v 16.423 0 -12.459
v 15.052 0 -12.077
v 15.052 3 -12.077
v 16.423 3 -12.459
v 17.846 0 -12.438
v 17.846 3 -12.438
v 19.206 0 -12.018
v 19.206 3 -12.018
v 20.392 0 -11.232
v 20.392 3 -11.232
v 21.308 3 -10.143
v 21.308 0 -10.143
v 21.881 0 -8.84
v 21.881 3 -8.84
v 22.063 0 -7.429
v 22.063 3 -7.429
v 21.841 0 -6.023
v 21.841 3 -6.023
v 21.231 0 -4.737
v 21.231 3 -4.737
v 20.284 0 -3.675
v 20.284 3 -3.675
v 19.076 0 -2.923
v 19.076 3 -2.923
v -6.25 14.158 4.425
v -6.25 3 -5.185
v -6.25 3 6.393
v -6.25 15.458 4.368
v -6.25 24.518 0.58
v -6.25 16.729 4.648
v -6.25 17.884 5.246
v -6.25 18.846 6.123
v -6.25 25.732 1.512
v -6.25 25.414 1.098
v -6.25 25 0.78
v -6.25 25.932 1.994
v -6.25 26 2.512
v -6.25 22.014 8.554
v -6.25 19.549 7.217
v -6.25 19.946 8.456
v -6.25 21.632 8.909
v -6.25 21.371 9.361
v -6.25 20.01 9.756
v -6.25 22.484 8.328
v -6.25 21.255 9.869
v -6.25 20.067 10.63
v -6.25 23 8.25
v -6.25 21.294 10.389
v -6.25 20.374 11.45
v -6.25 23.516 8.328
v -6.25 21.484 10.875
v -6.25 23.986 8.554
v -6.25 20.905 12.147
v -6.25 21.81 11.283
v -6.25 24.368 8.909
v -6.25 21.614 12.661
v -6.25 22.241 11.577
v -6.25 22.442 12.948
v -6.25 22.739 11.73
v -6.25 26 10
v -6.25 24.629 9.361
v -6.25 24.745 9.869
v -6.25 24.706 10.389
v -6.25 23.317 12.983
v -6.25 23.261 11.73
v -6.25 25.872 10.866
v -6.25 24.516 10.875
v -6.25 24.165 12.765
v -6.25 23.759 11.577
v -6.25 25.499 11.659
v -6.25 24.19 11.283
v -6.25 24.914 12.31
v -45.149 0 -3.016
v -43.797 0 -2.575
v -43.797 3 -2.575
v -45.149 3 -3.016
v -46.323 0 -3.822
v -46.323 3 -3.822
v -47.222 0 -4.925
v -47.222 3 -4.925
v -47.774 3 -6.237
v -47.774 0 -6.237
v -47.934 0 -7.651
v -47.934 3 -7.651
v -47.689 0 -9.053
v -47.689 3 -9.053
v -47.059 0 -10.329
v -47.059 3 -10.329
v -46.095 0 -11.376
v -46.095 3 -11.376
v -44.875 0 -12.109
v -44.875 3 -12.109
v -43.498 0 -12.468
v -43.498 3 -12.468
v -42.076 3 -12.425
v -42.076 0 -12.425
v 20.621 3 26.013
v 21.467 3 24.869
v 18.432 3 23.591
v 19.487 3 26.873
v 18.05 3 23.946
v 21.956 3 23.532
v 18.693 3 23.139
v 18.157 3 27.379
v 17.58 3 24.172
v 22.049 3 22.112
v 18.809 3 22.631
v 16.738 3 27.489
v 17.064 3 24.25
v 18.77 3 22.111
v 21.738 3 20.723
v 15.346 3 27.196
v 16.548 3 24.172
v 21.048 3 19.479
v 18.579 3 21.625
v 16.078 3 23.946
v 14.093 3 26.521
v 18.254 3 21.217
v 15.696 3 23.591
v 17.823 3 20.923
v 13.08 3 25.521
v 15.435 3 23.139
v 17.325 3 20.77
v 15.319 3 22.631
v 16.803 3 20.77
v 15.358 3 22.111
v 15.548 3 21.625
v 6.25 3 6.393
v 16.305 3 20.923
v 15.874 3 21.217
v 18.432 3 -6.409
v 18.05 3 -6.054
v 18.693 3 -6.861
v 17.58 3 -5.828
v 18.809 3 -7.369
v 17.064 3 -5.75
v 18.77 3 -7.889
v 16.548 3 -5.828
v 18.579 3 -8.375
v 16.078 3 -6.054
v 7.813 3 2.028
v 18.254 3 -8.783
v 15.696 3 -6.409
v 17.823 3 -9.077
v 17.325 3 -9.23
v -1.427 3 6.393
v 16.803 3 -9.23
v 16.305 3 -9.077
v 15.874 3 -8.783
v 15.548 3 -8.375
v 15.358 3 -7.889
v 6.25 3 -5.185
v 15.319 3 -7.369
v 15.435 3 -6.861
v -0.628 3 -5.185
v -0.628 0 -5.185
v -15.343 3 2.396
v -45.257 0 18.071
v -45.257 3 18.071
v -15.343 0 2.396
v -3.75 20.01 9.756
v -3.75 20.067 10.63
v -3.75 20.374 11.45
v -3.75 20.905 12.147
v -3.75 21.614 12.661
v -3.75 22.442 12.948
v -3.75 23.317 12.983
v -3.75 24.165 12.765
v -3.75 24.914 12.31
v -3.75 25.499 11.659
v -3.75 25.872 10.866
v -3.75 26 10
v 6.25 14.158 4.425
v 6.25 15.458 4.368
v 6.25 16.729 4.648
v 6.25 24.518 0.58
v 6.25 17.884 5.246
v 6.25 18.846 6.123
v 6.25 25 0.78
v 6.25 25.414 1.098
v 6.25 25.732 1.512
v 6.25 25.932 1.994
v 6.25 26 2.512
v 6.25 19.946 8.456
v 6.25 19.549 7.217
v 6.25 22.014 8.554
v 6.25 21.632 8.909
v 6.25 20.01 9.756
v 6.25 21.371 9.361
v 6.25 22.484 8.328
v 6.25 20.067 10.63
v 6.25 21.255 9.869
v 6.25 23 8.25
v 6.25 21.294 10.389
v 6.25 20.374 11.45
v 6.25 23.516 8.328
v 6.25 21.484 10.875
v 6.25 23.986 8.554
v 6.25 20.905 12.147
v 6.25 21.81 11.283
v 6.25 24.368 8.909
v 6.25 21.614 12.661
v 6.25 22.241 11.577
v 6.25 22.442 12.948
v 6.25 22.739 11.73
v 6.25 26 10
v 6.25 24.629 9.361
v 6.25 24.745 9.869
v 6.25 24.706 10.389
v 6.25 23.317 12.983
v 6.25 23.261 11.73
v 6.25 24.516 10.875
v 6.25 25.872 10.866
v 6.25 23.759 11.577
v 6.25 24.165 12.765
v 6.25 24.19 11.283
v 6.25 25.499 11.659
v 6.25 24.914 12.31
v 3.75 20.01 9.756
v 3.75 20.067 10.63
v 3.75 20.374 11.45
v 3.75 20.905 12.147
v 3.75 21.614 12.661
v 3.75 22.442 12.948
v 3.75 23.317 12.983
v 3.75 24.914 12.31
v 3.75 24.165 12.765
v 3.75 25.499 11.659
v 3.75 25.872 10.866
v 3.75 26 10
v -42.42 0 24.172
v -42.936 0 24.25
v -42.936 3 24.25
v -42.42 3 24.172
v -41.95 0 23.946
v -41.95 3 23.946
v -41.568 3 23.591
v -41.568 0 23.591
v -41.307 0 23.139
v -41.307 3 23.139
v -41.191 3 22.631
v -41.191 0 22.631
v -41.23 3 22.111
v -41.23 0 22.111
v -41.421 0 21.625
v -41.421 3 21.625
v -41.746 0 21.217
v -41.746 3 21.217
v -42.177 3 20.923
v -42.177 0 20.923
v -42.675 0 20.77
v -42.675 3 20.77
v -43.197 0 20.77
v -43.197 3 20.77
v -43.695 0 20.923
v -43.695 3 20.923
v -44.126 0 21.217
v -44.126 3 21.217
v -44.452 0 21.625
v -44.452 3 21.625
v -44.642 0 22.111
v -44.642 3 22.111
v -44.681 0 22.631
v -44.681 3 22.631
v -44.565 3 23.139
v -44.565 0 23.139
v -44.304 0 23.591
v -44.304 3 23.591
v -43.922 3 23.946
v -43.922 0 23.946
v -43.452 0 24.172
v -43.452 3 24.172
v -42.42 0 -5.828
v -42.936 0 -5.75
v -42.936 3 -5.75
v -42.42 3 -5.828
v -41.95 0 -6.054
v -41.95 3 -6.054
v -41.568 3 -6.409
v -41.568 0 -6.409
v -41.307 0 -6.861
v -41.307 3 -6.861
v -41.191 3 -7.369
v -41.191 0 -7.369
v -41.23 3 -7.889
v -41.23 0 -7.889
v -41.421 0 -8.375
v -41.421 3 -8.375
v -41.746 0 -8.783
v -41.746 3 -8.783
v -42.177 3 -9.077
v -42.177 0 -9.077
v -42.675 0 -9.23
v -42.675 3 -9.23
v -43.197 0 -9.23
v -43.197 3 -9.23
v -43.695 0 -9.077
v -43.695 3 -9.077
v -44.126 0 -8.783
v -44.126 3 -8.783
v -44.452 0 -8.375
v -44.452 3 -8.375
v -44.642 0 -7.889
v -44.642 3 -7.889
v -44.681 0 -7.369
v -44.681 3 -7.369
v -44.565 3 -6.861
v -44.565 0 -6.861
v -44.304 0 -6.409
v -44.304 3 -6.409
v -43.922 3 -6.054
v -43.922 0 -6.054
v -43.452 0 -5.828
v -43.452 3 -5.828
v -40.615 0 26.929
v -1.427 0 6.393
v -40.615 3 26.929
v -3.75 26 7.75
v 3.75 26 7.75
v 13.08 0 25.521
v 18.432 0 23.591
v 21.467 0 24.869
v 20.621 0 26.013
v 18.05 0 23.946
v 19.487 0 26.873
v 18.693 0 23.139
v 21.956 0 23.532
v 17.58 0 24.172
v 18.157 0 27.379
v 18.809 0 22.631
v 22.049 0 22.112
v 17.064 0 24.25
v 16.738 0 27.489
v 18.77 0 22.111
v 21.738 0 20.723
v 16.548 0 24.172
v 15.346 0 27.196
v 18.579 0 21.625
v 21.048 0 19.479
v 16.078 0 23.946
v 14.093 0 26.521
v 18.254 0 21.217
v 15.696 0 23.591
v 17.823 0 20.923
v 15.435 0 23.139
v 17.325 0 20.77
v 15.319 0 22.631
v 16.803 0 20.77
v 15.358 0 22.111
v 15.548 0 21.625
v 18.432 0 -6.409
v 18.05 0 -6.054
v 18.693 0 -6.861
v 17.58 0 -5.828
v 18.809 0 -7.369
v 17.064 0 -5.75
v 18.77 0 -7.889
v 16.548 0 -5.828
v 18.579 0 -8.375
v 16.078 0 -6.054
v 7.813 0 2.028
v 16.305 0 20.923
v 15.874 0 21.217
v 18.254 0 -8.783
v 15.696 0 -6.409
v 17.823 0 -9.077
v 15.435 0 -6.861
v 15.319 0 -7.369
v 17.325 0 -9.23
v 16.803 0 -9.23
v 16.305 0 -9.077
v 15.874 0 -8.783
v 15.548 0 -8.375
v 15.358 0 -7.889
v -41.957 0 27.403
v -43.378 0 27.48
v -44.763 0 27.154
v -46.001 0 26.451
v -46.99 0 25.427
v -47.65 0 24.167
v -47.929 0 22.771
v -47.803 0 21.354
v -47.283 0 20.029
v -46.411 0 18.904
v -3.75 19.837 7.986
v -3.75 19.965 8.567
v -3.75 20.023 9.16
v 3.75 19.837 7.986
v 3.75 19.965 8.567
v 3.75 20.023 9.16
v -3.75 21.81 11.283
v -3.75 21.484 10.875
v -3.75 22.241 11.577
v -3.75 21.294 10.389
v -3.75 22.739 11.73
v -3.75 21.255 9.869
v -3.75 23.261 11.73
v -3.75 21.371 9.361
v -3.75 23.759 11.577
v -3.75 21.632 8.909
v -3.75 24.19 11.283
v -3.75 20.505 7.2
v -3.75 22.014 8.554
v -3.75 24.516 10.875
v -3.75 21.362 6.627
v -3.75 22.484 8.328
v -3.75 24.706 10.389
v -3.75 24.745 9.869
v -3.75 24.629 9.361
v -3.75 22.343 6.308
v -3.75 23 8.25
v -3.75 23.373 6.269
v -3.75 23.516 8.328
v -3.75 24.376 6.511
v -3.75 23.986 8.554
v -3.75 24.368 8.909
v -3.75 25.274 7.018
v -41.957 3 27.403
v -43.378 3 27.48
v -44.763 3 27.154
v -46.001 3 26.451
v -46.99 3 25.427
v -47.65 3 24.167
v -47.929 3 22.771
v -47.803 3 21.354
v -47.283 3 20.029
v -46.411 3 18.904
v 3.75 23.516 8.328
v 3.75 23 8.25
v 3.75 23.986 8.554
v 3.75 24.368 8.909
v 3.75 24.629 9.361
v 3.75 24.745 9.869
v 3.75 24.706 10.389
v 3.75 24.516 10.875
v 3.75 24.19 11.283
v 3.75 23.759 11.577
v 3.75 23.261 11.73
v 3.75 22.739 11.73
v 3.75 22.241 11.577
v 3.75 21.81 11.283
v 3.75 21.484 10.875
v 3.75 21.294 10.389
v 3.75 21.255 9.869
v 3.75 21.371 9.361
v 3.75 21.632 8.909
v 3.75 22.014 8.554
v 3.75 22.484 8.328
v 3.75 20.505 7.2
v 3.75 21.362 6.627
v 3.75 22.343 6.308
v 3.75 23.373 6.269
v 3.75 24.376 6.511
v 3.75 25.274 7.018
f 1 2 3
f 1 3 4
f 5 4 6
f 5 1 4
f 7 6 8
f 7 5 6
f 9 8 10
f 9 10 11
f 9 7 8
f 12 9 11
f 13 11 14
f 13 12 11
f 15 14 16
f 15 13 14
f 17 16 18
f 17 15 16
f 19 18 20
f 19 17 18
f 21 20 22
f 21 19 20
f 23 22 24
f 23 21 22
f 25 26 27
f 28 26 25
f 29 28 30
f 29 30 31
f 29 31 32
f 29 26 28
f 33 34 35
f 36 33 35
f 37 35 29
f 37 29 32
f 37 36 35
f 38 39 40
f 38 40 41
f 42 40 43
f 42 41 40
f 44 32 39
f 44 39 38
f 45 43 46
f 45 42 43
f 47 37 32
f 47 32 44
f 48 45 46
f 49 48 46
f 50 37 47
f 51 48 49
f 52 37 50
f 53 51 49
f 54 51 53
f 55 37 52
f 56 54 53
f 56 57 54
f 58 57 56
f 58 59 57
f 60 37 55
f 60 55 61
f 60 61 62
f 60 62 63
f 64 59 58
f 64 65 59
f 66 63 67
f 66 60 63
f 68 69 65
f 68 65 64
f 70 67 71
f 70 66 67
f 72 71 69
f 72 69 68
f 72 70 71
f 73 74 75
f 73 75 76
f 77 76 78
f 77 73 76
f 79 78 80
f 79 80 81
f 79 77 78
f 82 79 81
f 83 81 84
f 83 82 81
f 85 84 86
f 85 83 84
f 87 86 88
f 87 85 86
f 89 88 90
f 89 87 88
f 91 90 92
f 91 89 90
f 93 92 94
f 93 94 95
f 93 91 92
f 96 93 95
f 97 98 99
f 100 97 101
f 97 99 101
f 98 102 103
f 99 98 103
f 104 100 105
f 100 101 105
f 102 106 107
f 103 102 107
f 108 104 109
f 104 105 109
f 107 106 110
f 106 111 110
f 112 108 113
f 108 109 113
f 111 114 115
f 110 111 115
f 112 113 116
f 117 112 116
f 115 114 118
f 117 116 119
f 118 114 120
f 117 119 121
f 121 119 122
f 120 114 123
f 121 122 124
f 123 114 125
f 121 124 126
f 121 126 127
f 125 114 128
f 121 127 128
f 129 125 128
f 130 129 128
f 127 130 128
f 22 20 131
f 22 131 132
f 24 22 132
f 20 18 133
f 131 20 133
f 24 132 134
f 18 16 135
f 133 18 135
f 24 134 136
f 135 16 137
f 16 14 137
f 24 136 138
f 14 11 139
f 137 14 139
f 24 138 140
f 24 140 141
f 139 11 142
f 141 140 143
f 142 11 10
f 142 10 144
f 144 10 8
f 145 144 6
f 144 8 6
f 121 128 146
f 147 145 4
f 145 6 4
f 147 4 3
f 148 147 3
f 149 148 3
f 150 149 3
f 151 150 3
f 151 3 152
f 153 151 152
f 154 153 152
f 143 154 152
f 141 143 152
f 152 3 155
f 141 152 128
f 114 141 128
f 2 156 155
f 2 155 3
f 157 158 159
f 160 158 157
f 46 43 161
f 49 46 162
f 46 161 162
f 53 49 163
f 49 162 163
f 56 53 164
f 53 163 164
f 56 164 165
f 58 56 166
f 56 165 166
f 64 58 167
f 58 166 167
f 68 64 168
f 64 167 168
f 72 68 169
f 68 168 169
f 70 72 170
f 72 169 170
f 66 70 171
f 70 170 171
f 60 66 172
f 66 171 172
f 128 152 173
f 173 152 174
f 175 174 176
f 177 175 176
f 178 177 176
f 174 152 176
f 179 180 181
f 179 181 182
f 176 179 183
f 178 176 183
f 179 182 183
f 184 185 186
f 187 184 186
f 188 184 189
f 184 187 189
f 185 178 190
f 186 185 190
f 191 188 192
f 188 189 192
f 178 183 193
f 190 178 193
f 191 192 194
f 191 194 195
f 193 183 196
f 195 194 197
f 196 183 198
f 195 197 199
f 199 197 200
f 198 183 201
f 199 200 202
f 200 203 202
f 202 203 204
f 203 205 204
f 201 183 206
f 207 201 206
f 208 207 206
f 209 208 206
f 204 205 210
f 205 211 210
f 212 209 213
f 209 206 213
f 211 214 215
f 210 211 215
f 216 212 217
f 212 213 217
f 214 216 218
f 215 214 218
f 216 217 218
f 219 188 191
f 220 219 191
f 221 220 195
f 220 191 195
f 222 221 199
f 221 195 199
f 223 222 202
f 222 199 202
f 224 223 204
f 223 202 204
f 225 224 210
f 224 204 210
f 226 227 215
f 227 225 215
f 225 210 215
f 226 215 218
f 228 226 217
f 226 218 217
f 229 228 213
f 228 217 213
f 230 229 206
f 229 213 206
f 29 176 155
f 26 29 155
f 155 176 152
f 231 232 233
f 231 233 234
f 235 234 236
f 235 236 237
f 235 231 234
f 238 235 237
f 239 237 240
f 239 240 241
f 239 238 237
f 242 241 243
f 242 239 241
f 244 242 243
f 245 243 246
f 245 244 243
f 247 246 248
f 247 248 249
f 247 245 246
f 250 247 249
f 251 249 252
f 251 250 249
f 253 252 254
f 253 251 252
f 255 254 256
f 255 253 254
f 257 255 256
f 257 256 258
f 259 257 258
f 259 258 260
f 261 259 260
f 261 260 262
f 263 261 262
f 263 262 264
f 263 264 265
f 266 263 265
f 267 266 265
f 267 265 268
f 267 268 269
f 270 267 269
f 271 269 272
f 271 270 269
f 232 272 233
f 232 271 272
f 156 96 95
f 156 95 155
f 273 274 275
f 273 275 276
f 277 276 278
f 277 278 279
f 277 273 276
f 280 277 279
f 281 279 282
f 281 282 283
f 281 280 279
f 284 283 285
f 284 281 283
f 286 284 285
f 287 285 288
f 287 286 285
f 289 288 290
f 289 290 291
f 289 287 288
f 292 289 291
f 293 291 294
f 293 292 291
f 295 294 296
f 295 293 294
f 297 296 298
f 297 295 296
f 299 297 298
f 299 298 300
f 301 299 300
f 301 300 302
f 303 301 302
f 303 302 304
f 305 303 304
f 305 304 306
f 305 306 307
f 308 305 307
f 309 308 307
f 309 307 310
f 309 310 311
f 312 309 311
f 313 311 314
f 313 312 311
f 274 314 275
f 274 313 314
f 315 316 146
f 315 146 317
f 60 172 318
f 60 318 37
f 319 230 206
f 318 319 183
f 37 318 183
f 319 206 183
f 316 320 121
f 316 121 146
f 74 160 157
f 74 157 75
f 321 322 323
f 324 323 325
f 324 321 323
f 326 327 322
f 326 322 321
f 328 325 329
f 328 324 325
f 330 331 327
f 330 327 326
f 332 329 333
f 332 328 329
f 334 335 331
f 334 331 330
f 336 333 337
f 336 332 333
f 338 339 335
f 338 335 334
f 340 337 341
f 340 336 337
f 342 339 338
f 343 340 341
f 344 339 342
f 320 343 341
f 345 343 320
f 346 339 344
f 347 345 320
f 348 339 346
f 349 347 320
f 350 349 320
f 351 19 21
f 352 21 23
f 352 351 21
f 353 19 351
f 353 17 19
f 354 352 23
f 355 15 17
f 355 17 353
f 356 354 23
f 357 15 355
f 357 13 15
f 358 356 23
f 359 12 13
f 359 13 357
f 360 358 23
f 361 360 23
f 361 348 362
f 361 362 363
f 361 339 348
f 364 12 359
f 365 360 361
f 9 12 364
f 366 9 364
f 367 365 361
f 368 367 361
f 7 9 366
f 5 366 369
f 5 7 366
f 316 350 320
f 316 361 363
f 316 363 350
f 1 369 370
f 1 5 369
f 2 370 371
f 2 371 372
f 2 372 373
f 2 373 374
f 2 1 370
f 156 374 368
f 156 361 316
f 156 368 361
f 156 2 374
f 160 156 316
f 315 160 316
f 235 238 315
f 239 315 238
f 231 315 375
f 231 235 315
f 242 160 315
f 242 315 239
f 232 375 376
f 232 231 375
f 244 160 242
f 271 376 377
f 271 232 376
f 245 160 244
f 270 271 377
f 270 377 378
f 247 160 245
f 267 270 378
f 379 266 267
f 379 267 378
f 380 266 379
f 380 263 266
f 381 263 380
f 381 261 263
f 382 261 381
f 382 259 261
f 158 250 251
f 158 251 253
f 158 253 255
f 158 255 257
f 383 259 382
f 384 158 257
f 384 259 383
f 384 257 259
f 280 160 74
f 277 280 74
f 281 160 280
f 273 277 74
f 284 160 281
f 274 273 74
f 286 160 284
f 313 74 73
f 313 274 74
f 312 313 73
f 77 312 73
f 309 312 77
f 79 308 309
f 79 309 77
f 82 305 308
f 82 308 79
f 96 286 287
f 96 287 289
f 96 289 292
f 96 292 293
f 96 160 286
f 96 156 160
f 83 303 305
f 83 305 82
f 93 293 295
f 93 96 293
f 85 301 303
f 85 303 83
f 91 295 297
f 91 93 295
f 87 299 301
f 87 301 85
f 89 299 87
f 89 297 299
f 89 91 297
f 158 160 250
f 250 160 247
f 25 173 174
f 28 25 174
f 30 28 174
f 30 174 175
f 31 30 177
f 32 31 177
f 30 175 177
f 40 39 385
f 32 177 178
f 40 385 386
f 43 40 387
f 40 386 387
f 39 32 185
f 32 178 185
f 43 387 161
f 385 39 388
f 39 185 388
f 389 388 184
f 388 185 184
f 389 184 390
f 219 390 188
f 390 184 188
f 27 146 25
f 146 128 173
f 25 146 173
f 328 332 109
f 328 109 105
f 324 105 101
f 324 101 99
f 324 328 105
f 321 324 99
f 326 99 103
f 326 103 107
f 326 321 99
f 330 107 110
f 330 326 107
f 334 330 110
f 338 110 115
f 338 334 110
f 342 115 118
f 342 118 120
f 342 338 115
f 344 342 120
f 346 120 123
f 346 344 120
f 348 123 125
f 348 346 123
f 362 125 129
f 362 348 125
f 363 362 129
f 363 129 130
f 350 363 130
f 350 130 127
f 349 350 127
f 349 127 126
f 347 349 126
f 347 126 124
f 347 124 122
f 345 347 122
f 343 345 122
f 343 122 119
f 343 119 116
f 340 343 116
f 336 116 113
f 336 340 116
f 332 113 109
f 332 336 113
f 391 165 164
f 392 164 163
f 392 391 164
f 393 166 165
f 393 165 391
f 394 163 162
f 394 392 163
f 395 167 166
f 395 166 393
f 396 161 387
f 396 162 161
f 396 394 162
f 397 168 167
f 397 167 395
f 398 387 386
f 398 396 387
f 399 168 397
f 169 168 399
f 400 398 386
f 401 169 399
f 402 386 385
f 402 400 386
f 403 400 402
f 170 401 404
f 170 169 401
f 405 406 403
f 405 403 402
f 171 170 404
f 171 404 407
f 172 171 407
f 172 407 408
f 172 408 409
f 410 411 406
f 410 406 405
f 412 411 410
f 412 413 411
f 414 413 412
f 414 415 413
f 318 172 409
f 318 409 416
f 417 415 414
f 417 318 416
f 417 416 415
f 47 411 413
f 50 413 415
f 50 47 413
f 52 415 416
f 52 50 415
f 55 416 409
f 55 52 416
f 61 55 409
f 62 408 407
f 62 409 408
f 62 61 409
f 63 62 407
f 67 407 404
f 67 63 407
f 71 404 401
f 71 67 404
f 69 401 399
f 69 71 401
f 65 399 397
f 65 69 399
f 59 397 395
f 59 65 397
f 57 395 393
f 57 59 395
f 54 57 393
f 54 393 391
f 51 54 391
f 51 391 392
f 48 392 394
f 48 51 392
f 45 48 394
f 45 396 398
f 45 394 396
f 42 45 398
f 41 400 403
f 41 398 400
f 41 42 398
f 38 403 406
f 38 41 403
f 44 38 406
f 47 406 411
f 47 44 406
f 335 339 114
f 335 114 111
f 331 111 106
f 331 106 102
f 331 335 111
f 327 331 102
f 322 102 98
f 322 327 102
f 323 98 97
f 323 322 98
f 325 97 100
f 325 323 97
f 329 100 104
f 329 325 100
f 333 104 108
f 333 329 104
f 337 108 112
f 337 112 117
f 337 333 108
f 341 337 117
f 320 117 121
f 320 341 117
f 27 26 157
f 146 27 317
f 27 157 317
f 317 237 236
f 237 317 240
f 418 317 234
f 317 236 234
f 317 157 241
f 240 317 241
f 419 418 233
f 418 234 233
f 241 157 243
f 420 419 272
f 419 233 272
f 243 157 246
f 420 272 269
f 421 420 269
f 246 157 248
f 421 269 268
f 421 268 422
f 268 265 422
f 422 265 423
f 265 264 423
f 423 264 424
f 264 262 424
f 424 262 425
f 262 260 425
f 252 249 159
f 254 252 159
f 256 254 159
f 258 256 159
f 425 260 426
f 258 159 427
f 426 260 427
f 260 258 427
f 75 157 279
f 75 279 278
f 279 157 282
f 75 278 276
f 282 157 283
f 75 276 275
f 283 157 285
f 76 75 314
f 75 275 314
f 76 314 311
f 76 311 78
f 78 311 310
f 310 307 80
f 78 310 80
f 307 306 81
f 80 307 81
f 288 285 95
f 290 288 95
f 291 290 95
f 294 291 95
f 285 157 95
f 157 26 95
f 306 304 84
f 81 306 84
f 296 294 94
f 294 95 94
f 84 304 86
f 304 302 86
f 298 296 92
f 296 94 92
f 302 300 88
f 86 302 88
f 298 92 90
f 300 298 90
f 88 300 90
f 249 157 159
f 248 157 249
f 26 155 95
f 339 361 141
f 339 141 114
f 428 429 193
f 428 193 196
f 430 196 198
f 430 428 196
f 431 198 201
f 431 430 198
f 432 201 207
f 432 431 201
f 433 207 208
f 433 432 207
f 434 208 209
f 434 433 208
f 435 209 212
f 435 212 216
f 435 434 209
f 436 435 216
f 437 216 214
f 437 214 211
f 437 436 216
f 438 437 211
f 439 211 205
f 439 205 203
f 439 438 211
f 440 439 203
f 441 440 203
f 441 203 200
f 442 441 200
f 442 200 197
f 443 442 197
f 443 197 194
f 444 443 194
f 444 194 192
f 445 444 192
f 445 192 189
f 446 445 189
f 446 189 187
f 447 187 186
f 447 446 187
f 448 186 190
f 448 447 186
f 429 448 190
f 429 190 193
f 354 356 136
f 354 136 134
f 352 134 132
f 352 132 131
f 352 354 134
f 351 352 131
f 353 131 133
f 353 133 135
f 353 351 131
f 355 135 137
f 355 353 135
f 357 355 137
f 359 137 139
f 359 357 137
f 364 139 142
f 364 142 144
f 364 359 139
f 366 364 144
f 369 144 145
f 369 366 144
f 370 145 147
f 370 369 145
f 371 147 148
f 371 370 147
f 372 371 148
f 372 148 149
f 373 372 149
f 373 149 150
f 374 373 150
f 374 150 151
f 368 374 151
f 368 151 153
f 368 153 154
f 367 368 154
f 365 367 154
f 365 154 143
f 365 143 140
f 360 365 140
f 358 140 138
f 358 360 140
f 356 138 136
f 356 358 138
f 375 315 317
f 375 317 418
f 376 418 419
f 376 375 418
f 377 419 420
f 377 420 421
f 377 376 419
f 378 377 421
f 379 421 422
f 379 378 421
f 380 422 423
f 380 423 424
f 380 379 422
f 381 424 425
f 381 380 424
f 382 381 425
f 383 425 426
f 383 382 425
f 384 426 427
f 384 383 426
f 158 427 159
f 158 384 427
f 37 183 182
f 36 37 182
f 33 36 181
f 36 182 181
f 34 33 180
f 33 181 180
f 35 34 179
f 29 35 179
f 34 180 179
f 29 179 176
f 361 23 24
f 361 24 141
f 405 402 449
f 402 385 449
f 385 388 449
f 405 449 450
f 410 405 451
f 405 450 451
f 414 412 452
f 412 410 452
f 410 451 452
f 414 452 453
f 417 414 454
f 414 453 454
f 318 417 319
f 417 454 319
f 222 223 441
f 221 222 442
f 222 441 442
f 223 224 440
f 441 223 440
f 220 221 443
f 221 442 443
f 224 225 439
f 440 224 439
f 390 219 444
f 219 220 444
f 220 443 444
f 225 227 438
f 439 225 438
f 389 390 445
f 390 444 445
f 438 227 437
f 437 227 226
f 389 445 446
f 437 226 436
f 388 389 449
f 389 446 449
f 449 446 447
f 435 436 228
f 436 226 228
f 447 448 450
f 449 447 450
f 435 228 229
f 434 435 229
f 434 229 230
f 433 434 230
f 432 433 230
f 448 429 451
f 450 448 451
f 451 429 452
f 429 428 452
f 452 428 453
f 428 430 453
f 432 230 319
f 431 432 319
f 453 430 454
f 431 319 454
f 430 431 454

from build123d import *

# Parameters (mm, degrees)
SKETCH1_R           = 1.75
BOSS_EXTRUDE1_DEPTH = 3
SKETCH2_R           = 1.75
BOSS_EXTRUDE2_DEPTH = 6.25
SKETCH3_R           = 3.75
CUT_EXTRUDE1_DEPTH  = 3.75


with BuildPart() as part:
    # Sketch1 → Boss-Extrude1 (new body)
    with BuildSketch(Plane(origin=(0, 0, 0), x_dir=(1, 0, 0), z_dir=(0, 1, 0))):
        with BuildLine():
            Line((-45.257003151, -18.071250027), (-15.343449858, -2.395547337))
            Line((-15.343449858, -2.395547337), (-43.796551891, 2.574578453))
            ThreePointArc((-43.796551891, 2.574578453), (-47.861611547, 8.360361891), (-42.075828109, 12.425421547))
            Line((-42.075828109, 12.425421547), (-0.628357098, 5.185467732))
            Line((-0.628357098, 5.185467732), (15.051932182, 12.077373444))
            ThreePointArc((15.051932182, 12.077373444), (21.641183444, 9.511877818), (19.075687818, 2.922626556))
            Line((19.075687818, 2.922626556), (7.812998809, -2.027625912))
            Line((7.812998809, -2.027625912), (21.047705857, -19.478647024))
            ThreePointArc((21.047705857, -19.478647024), (20.085162976, -26.483895857), (13.079914143, -25.521352976))
            Line((13.079914143, -25.521352976), (-1.427051817, -6.392756601))
            Line((-1.427051817, -6.392756601), (-40.615376849, -26.928749973))
            ThreePointArc((-40.615376849, -26.928749973), (-47.364939973, -24.820813151), (-45.257003151, -18.071250027))
        make_face()
        with Locations(Location((-42.93619, -22.5, 0), (0, 0, 270))):
            Circle(SKETCH1_R, mode=Mode.SUBTRACT)
        with Locations(Location((-42.93619, 7.5, 0), (0, 0, 270))):
            Circle(SKETCH1_R, mode=Mode.SUBTRACT)
        with Locations(Location((17.06381, 7.5, 0), (0, 0, 270))):
            Circle(SKETCH1_R, mode=Mode.SUBTRACT)
        with Locations(Location((17.06381, -22.5, 0), (0, 0, 270))):
            Circle(SKETCH1_R, mode=Mode.SUBTRACT)
    extrude(amount=BOSS_EXTRUDE1_DEPTH)

    # Sketch2 → Boss-Extrude2 (add, symmetric)
    with BuildSketch(Plane(origin=(0, 0, 0), x_dir=(0, 0, -1), z_dir=(1, 0, 0))):
        with BuildLine():
            Line((-6.392756601, 3), (-4.425253098, 14.158266845))
            ThreePointArc((-4.425253098, 14.158266845), (-5.653060678, 18.393683854), (-9.755984449, 20.0099404))
            ThreePointArc((-9.755984449, 20.0099404), (-12.99751387, 22.877891031), (-10, 26))
            Line((-10, 26), (-2.51201767, 26))
            ThreePointArc((-2.51201767, 26), (-1.294494812, 25.586706681), (-0.580166017, 24.51763809))
            Line((-0.580166017, 24.51763809), (5.185467732, 3))
            Line((5.185467732, 3), (-6.392756601, 3))
        make_face()
        with Locations((-10, 23)):
            Circle(SKETCH2_R, mode=Mode.SUBTRACT)
    extrude(amount=BOSS_EXTRUDE2_DEPTH, both=True)

    # Sketch3 → Cut-Extrude1 (cut, symmetric)
    with BuildSketch(Plane(origin=(0, 0, 0), x_dir=(0, 0, -1), z_dir=(1, 0, 0))):
        with Locations((-10, 23)):
            Circle(SKETCH3_R)
    extrude(amount=CUT_EXTRUDE1_DEPTH, both=True, mode=Mode.SUBTRACT)


solid = part.part
